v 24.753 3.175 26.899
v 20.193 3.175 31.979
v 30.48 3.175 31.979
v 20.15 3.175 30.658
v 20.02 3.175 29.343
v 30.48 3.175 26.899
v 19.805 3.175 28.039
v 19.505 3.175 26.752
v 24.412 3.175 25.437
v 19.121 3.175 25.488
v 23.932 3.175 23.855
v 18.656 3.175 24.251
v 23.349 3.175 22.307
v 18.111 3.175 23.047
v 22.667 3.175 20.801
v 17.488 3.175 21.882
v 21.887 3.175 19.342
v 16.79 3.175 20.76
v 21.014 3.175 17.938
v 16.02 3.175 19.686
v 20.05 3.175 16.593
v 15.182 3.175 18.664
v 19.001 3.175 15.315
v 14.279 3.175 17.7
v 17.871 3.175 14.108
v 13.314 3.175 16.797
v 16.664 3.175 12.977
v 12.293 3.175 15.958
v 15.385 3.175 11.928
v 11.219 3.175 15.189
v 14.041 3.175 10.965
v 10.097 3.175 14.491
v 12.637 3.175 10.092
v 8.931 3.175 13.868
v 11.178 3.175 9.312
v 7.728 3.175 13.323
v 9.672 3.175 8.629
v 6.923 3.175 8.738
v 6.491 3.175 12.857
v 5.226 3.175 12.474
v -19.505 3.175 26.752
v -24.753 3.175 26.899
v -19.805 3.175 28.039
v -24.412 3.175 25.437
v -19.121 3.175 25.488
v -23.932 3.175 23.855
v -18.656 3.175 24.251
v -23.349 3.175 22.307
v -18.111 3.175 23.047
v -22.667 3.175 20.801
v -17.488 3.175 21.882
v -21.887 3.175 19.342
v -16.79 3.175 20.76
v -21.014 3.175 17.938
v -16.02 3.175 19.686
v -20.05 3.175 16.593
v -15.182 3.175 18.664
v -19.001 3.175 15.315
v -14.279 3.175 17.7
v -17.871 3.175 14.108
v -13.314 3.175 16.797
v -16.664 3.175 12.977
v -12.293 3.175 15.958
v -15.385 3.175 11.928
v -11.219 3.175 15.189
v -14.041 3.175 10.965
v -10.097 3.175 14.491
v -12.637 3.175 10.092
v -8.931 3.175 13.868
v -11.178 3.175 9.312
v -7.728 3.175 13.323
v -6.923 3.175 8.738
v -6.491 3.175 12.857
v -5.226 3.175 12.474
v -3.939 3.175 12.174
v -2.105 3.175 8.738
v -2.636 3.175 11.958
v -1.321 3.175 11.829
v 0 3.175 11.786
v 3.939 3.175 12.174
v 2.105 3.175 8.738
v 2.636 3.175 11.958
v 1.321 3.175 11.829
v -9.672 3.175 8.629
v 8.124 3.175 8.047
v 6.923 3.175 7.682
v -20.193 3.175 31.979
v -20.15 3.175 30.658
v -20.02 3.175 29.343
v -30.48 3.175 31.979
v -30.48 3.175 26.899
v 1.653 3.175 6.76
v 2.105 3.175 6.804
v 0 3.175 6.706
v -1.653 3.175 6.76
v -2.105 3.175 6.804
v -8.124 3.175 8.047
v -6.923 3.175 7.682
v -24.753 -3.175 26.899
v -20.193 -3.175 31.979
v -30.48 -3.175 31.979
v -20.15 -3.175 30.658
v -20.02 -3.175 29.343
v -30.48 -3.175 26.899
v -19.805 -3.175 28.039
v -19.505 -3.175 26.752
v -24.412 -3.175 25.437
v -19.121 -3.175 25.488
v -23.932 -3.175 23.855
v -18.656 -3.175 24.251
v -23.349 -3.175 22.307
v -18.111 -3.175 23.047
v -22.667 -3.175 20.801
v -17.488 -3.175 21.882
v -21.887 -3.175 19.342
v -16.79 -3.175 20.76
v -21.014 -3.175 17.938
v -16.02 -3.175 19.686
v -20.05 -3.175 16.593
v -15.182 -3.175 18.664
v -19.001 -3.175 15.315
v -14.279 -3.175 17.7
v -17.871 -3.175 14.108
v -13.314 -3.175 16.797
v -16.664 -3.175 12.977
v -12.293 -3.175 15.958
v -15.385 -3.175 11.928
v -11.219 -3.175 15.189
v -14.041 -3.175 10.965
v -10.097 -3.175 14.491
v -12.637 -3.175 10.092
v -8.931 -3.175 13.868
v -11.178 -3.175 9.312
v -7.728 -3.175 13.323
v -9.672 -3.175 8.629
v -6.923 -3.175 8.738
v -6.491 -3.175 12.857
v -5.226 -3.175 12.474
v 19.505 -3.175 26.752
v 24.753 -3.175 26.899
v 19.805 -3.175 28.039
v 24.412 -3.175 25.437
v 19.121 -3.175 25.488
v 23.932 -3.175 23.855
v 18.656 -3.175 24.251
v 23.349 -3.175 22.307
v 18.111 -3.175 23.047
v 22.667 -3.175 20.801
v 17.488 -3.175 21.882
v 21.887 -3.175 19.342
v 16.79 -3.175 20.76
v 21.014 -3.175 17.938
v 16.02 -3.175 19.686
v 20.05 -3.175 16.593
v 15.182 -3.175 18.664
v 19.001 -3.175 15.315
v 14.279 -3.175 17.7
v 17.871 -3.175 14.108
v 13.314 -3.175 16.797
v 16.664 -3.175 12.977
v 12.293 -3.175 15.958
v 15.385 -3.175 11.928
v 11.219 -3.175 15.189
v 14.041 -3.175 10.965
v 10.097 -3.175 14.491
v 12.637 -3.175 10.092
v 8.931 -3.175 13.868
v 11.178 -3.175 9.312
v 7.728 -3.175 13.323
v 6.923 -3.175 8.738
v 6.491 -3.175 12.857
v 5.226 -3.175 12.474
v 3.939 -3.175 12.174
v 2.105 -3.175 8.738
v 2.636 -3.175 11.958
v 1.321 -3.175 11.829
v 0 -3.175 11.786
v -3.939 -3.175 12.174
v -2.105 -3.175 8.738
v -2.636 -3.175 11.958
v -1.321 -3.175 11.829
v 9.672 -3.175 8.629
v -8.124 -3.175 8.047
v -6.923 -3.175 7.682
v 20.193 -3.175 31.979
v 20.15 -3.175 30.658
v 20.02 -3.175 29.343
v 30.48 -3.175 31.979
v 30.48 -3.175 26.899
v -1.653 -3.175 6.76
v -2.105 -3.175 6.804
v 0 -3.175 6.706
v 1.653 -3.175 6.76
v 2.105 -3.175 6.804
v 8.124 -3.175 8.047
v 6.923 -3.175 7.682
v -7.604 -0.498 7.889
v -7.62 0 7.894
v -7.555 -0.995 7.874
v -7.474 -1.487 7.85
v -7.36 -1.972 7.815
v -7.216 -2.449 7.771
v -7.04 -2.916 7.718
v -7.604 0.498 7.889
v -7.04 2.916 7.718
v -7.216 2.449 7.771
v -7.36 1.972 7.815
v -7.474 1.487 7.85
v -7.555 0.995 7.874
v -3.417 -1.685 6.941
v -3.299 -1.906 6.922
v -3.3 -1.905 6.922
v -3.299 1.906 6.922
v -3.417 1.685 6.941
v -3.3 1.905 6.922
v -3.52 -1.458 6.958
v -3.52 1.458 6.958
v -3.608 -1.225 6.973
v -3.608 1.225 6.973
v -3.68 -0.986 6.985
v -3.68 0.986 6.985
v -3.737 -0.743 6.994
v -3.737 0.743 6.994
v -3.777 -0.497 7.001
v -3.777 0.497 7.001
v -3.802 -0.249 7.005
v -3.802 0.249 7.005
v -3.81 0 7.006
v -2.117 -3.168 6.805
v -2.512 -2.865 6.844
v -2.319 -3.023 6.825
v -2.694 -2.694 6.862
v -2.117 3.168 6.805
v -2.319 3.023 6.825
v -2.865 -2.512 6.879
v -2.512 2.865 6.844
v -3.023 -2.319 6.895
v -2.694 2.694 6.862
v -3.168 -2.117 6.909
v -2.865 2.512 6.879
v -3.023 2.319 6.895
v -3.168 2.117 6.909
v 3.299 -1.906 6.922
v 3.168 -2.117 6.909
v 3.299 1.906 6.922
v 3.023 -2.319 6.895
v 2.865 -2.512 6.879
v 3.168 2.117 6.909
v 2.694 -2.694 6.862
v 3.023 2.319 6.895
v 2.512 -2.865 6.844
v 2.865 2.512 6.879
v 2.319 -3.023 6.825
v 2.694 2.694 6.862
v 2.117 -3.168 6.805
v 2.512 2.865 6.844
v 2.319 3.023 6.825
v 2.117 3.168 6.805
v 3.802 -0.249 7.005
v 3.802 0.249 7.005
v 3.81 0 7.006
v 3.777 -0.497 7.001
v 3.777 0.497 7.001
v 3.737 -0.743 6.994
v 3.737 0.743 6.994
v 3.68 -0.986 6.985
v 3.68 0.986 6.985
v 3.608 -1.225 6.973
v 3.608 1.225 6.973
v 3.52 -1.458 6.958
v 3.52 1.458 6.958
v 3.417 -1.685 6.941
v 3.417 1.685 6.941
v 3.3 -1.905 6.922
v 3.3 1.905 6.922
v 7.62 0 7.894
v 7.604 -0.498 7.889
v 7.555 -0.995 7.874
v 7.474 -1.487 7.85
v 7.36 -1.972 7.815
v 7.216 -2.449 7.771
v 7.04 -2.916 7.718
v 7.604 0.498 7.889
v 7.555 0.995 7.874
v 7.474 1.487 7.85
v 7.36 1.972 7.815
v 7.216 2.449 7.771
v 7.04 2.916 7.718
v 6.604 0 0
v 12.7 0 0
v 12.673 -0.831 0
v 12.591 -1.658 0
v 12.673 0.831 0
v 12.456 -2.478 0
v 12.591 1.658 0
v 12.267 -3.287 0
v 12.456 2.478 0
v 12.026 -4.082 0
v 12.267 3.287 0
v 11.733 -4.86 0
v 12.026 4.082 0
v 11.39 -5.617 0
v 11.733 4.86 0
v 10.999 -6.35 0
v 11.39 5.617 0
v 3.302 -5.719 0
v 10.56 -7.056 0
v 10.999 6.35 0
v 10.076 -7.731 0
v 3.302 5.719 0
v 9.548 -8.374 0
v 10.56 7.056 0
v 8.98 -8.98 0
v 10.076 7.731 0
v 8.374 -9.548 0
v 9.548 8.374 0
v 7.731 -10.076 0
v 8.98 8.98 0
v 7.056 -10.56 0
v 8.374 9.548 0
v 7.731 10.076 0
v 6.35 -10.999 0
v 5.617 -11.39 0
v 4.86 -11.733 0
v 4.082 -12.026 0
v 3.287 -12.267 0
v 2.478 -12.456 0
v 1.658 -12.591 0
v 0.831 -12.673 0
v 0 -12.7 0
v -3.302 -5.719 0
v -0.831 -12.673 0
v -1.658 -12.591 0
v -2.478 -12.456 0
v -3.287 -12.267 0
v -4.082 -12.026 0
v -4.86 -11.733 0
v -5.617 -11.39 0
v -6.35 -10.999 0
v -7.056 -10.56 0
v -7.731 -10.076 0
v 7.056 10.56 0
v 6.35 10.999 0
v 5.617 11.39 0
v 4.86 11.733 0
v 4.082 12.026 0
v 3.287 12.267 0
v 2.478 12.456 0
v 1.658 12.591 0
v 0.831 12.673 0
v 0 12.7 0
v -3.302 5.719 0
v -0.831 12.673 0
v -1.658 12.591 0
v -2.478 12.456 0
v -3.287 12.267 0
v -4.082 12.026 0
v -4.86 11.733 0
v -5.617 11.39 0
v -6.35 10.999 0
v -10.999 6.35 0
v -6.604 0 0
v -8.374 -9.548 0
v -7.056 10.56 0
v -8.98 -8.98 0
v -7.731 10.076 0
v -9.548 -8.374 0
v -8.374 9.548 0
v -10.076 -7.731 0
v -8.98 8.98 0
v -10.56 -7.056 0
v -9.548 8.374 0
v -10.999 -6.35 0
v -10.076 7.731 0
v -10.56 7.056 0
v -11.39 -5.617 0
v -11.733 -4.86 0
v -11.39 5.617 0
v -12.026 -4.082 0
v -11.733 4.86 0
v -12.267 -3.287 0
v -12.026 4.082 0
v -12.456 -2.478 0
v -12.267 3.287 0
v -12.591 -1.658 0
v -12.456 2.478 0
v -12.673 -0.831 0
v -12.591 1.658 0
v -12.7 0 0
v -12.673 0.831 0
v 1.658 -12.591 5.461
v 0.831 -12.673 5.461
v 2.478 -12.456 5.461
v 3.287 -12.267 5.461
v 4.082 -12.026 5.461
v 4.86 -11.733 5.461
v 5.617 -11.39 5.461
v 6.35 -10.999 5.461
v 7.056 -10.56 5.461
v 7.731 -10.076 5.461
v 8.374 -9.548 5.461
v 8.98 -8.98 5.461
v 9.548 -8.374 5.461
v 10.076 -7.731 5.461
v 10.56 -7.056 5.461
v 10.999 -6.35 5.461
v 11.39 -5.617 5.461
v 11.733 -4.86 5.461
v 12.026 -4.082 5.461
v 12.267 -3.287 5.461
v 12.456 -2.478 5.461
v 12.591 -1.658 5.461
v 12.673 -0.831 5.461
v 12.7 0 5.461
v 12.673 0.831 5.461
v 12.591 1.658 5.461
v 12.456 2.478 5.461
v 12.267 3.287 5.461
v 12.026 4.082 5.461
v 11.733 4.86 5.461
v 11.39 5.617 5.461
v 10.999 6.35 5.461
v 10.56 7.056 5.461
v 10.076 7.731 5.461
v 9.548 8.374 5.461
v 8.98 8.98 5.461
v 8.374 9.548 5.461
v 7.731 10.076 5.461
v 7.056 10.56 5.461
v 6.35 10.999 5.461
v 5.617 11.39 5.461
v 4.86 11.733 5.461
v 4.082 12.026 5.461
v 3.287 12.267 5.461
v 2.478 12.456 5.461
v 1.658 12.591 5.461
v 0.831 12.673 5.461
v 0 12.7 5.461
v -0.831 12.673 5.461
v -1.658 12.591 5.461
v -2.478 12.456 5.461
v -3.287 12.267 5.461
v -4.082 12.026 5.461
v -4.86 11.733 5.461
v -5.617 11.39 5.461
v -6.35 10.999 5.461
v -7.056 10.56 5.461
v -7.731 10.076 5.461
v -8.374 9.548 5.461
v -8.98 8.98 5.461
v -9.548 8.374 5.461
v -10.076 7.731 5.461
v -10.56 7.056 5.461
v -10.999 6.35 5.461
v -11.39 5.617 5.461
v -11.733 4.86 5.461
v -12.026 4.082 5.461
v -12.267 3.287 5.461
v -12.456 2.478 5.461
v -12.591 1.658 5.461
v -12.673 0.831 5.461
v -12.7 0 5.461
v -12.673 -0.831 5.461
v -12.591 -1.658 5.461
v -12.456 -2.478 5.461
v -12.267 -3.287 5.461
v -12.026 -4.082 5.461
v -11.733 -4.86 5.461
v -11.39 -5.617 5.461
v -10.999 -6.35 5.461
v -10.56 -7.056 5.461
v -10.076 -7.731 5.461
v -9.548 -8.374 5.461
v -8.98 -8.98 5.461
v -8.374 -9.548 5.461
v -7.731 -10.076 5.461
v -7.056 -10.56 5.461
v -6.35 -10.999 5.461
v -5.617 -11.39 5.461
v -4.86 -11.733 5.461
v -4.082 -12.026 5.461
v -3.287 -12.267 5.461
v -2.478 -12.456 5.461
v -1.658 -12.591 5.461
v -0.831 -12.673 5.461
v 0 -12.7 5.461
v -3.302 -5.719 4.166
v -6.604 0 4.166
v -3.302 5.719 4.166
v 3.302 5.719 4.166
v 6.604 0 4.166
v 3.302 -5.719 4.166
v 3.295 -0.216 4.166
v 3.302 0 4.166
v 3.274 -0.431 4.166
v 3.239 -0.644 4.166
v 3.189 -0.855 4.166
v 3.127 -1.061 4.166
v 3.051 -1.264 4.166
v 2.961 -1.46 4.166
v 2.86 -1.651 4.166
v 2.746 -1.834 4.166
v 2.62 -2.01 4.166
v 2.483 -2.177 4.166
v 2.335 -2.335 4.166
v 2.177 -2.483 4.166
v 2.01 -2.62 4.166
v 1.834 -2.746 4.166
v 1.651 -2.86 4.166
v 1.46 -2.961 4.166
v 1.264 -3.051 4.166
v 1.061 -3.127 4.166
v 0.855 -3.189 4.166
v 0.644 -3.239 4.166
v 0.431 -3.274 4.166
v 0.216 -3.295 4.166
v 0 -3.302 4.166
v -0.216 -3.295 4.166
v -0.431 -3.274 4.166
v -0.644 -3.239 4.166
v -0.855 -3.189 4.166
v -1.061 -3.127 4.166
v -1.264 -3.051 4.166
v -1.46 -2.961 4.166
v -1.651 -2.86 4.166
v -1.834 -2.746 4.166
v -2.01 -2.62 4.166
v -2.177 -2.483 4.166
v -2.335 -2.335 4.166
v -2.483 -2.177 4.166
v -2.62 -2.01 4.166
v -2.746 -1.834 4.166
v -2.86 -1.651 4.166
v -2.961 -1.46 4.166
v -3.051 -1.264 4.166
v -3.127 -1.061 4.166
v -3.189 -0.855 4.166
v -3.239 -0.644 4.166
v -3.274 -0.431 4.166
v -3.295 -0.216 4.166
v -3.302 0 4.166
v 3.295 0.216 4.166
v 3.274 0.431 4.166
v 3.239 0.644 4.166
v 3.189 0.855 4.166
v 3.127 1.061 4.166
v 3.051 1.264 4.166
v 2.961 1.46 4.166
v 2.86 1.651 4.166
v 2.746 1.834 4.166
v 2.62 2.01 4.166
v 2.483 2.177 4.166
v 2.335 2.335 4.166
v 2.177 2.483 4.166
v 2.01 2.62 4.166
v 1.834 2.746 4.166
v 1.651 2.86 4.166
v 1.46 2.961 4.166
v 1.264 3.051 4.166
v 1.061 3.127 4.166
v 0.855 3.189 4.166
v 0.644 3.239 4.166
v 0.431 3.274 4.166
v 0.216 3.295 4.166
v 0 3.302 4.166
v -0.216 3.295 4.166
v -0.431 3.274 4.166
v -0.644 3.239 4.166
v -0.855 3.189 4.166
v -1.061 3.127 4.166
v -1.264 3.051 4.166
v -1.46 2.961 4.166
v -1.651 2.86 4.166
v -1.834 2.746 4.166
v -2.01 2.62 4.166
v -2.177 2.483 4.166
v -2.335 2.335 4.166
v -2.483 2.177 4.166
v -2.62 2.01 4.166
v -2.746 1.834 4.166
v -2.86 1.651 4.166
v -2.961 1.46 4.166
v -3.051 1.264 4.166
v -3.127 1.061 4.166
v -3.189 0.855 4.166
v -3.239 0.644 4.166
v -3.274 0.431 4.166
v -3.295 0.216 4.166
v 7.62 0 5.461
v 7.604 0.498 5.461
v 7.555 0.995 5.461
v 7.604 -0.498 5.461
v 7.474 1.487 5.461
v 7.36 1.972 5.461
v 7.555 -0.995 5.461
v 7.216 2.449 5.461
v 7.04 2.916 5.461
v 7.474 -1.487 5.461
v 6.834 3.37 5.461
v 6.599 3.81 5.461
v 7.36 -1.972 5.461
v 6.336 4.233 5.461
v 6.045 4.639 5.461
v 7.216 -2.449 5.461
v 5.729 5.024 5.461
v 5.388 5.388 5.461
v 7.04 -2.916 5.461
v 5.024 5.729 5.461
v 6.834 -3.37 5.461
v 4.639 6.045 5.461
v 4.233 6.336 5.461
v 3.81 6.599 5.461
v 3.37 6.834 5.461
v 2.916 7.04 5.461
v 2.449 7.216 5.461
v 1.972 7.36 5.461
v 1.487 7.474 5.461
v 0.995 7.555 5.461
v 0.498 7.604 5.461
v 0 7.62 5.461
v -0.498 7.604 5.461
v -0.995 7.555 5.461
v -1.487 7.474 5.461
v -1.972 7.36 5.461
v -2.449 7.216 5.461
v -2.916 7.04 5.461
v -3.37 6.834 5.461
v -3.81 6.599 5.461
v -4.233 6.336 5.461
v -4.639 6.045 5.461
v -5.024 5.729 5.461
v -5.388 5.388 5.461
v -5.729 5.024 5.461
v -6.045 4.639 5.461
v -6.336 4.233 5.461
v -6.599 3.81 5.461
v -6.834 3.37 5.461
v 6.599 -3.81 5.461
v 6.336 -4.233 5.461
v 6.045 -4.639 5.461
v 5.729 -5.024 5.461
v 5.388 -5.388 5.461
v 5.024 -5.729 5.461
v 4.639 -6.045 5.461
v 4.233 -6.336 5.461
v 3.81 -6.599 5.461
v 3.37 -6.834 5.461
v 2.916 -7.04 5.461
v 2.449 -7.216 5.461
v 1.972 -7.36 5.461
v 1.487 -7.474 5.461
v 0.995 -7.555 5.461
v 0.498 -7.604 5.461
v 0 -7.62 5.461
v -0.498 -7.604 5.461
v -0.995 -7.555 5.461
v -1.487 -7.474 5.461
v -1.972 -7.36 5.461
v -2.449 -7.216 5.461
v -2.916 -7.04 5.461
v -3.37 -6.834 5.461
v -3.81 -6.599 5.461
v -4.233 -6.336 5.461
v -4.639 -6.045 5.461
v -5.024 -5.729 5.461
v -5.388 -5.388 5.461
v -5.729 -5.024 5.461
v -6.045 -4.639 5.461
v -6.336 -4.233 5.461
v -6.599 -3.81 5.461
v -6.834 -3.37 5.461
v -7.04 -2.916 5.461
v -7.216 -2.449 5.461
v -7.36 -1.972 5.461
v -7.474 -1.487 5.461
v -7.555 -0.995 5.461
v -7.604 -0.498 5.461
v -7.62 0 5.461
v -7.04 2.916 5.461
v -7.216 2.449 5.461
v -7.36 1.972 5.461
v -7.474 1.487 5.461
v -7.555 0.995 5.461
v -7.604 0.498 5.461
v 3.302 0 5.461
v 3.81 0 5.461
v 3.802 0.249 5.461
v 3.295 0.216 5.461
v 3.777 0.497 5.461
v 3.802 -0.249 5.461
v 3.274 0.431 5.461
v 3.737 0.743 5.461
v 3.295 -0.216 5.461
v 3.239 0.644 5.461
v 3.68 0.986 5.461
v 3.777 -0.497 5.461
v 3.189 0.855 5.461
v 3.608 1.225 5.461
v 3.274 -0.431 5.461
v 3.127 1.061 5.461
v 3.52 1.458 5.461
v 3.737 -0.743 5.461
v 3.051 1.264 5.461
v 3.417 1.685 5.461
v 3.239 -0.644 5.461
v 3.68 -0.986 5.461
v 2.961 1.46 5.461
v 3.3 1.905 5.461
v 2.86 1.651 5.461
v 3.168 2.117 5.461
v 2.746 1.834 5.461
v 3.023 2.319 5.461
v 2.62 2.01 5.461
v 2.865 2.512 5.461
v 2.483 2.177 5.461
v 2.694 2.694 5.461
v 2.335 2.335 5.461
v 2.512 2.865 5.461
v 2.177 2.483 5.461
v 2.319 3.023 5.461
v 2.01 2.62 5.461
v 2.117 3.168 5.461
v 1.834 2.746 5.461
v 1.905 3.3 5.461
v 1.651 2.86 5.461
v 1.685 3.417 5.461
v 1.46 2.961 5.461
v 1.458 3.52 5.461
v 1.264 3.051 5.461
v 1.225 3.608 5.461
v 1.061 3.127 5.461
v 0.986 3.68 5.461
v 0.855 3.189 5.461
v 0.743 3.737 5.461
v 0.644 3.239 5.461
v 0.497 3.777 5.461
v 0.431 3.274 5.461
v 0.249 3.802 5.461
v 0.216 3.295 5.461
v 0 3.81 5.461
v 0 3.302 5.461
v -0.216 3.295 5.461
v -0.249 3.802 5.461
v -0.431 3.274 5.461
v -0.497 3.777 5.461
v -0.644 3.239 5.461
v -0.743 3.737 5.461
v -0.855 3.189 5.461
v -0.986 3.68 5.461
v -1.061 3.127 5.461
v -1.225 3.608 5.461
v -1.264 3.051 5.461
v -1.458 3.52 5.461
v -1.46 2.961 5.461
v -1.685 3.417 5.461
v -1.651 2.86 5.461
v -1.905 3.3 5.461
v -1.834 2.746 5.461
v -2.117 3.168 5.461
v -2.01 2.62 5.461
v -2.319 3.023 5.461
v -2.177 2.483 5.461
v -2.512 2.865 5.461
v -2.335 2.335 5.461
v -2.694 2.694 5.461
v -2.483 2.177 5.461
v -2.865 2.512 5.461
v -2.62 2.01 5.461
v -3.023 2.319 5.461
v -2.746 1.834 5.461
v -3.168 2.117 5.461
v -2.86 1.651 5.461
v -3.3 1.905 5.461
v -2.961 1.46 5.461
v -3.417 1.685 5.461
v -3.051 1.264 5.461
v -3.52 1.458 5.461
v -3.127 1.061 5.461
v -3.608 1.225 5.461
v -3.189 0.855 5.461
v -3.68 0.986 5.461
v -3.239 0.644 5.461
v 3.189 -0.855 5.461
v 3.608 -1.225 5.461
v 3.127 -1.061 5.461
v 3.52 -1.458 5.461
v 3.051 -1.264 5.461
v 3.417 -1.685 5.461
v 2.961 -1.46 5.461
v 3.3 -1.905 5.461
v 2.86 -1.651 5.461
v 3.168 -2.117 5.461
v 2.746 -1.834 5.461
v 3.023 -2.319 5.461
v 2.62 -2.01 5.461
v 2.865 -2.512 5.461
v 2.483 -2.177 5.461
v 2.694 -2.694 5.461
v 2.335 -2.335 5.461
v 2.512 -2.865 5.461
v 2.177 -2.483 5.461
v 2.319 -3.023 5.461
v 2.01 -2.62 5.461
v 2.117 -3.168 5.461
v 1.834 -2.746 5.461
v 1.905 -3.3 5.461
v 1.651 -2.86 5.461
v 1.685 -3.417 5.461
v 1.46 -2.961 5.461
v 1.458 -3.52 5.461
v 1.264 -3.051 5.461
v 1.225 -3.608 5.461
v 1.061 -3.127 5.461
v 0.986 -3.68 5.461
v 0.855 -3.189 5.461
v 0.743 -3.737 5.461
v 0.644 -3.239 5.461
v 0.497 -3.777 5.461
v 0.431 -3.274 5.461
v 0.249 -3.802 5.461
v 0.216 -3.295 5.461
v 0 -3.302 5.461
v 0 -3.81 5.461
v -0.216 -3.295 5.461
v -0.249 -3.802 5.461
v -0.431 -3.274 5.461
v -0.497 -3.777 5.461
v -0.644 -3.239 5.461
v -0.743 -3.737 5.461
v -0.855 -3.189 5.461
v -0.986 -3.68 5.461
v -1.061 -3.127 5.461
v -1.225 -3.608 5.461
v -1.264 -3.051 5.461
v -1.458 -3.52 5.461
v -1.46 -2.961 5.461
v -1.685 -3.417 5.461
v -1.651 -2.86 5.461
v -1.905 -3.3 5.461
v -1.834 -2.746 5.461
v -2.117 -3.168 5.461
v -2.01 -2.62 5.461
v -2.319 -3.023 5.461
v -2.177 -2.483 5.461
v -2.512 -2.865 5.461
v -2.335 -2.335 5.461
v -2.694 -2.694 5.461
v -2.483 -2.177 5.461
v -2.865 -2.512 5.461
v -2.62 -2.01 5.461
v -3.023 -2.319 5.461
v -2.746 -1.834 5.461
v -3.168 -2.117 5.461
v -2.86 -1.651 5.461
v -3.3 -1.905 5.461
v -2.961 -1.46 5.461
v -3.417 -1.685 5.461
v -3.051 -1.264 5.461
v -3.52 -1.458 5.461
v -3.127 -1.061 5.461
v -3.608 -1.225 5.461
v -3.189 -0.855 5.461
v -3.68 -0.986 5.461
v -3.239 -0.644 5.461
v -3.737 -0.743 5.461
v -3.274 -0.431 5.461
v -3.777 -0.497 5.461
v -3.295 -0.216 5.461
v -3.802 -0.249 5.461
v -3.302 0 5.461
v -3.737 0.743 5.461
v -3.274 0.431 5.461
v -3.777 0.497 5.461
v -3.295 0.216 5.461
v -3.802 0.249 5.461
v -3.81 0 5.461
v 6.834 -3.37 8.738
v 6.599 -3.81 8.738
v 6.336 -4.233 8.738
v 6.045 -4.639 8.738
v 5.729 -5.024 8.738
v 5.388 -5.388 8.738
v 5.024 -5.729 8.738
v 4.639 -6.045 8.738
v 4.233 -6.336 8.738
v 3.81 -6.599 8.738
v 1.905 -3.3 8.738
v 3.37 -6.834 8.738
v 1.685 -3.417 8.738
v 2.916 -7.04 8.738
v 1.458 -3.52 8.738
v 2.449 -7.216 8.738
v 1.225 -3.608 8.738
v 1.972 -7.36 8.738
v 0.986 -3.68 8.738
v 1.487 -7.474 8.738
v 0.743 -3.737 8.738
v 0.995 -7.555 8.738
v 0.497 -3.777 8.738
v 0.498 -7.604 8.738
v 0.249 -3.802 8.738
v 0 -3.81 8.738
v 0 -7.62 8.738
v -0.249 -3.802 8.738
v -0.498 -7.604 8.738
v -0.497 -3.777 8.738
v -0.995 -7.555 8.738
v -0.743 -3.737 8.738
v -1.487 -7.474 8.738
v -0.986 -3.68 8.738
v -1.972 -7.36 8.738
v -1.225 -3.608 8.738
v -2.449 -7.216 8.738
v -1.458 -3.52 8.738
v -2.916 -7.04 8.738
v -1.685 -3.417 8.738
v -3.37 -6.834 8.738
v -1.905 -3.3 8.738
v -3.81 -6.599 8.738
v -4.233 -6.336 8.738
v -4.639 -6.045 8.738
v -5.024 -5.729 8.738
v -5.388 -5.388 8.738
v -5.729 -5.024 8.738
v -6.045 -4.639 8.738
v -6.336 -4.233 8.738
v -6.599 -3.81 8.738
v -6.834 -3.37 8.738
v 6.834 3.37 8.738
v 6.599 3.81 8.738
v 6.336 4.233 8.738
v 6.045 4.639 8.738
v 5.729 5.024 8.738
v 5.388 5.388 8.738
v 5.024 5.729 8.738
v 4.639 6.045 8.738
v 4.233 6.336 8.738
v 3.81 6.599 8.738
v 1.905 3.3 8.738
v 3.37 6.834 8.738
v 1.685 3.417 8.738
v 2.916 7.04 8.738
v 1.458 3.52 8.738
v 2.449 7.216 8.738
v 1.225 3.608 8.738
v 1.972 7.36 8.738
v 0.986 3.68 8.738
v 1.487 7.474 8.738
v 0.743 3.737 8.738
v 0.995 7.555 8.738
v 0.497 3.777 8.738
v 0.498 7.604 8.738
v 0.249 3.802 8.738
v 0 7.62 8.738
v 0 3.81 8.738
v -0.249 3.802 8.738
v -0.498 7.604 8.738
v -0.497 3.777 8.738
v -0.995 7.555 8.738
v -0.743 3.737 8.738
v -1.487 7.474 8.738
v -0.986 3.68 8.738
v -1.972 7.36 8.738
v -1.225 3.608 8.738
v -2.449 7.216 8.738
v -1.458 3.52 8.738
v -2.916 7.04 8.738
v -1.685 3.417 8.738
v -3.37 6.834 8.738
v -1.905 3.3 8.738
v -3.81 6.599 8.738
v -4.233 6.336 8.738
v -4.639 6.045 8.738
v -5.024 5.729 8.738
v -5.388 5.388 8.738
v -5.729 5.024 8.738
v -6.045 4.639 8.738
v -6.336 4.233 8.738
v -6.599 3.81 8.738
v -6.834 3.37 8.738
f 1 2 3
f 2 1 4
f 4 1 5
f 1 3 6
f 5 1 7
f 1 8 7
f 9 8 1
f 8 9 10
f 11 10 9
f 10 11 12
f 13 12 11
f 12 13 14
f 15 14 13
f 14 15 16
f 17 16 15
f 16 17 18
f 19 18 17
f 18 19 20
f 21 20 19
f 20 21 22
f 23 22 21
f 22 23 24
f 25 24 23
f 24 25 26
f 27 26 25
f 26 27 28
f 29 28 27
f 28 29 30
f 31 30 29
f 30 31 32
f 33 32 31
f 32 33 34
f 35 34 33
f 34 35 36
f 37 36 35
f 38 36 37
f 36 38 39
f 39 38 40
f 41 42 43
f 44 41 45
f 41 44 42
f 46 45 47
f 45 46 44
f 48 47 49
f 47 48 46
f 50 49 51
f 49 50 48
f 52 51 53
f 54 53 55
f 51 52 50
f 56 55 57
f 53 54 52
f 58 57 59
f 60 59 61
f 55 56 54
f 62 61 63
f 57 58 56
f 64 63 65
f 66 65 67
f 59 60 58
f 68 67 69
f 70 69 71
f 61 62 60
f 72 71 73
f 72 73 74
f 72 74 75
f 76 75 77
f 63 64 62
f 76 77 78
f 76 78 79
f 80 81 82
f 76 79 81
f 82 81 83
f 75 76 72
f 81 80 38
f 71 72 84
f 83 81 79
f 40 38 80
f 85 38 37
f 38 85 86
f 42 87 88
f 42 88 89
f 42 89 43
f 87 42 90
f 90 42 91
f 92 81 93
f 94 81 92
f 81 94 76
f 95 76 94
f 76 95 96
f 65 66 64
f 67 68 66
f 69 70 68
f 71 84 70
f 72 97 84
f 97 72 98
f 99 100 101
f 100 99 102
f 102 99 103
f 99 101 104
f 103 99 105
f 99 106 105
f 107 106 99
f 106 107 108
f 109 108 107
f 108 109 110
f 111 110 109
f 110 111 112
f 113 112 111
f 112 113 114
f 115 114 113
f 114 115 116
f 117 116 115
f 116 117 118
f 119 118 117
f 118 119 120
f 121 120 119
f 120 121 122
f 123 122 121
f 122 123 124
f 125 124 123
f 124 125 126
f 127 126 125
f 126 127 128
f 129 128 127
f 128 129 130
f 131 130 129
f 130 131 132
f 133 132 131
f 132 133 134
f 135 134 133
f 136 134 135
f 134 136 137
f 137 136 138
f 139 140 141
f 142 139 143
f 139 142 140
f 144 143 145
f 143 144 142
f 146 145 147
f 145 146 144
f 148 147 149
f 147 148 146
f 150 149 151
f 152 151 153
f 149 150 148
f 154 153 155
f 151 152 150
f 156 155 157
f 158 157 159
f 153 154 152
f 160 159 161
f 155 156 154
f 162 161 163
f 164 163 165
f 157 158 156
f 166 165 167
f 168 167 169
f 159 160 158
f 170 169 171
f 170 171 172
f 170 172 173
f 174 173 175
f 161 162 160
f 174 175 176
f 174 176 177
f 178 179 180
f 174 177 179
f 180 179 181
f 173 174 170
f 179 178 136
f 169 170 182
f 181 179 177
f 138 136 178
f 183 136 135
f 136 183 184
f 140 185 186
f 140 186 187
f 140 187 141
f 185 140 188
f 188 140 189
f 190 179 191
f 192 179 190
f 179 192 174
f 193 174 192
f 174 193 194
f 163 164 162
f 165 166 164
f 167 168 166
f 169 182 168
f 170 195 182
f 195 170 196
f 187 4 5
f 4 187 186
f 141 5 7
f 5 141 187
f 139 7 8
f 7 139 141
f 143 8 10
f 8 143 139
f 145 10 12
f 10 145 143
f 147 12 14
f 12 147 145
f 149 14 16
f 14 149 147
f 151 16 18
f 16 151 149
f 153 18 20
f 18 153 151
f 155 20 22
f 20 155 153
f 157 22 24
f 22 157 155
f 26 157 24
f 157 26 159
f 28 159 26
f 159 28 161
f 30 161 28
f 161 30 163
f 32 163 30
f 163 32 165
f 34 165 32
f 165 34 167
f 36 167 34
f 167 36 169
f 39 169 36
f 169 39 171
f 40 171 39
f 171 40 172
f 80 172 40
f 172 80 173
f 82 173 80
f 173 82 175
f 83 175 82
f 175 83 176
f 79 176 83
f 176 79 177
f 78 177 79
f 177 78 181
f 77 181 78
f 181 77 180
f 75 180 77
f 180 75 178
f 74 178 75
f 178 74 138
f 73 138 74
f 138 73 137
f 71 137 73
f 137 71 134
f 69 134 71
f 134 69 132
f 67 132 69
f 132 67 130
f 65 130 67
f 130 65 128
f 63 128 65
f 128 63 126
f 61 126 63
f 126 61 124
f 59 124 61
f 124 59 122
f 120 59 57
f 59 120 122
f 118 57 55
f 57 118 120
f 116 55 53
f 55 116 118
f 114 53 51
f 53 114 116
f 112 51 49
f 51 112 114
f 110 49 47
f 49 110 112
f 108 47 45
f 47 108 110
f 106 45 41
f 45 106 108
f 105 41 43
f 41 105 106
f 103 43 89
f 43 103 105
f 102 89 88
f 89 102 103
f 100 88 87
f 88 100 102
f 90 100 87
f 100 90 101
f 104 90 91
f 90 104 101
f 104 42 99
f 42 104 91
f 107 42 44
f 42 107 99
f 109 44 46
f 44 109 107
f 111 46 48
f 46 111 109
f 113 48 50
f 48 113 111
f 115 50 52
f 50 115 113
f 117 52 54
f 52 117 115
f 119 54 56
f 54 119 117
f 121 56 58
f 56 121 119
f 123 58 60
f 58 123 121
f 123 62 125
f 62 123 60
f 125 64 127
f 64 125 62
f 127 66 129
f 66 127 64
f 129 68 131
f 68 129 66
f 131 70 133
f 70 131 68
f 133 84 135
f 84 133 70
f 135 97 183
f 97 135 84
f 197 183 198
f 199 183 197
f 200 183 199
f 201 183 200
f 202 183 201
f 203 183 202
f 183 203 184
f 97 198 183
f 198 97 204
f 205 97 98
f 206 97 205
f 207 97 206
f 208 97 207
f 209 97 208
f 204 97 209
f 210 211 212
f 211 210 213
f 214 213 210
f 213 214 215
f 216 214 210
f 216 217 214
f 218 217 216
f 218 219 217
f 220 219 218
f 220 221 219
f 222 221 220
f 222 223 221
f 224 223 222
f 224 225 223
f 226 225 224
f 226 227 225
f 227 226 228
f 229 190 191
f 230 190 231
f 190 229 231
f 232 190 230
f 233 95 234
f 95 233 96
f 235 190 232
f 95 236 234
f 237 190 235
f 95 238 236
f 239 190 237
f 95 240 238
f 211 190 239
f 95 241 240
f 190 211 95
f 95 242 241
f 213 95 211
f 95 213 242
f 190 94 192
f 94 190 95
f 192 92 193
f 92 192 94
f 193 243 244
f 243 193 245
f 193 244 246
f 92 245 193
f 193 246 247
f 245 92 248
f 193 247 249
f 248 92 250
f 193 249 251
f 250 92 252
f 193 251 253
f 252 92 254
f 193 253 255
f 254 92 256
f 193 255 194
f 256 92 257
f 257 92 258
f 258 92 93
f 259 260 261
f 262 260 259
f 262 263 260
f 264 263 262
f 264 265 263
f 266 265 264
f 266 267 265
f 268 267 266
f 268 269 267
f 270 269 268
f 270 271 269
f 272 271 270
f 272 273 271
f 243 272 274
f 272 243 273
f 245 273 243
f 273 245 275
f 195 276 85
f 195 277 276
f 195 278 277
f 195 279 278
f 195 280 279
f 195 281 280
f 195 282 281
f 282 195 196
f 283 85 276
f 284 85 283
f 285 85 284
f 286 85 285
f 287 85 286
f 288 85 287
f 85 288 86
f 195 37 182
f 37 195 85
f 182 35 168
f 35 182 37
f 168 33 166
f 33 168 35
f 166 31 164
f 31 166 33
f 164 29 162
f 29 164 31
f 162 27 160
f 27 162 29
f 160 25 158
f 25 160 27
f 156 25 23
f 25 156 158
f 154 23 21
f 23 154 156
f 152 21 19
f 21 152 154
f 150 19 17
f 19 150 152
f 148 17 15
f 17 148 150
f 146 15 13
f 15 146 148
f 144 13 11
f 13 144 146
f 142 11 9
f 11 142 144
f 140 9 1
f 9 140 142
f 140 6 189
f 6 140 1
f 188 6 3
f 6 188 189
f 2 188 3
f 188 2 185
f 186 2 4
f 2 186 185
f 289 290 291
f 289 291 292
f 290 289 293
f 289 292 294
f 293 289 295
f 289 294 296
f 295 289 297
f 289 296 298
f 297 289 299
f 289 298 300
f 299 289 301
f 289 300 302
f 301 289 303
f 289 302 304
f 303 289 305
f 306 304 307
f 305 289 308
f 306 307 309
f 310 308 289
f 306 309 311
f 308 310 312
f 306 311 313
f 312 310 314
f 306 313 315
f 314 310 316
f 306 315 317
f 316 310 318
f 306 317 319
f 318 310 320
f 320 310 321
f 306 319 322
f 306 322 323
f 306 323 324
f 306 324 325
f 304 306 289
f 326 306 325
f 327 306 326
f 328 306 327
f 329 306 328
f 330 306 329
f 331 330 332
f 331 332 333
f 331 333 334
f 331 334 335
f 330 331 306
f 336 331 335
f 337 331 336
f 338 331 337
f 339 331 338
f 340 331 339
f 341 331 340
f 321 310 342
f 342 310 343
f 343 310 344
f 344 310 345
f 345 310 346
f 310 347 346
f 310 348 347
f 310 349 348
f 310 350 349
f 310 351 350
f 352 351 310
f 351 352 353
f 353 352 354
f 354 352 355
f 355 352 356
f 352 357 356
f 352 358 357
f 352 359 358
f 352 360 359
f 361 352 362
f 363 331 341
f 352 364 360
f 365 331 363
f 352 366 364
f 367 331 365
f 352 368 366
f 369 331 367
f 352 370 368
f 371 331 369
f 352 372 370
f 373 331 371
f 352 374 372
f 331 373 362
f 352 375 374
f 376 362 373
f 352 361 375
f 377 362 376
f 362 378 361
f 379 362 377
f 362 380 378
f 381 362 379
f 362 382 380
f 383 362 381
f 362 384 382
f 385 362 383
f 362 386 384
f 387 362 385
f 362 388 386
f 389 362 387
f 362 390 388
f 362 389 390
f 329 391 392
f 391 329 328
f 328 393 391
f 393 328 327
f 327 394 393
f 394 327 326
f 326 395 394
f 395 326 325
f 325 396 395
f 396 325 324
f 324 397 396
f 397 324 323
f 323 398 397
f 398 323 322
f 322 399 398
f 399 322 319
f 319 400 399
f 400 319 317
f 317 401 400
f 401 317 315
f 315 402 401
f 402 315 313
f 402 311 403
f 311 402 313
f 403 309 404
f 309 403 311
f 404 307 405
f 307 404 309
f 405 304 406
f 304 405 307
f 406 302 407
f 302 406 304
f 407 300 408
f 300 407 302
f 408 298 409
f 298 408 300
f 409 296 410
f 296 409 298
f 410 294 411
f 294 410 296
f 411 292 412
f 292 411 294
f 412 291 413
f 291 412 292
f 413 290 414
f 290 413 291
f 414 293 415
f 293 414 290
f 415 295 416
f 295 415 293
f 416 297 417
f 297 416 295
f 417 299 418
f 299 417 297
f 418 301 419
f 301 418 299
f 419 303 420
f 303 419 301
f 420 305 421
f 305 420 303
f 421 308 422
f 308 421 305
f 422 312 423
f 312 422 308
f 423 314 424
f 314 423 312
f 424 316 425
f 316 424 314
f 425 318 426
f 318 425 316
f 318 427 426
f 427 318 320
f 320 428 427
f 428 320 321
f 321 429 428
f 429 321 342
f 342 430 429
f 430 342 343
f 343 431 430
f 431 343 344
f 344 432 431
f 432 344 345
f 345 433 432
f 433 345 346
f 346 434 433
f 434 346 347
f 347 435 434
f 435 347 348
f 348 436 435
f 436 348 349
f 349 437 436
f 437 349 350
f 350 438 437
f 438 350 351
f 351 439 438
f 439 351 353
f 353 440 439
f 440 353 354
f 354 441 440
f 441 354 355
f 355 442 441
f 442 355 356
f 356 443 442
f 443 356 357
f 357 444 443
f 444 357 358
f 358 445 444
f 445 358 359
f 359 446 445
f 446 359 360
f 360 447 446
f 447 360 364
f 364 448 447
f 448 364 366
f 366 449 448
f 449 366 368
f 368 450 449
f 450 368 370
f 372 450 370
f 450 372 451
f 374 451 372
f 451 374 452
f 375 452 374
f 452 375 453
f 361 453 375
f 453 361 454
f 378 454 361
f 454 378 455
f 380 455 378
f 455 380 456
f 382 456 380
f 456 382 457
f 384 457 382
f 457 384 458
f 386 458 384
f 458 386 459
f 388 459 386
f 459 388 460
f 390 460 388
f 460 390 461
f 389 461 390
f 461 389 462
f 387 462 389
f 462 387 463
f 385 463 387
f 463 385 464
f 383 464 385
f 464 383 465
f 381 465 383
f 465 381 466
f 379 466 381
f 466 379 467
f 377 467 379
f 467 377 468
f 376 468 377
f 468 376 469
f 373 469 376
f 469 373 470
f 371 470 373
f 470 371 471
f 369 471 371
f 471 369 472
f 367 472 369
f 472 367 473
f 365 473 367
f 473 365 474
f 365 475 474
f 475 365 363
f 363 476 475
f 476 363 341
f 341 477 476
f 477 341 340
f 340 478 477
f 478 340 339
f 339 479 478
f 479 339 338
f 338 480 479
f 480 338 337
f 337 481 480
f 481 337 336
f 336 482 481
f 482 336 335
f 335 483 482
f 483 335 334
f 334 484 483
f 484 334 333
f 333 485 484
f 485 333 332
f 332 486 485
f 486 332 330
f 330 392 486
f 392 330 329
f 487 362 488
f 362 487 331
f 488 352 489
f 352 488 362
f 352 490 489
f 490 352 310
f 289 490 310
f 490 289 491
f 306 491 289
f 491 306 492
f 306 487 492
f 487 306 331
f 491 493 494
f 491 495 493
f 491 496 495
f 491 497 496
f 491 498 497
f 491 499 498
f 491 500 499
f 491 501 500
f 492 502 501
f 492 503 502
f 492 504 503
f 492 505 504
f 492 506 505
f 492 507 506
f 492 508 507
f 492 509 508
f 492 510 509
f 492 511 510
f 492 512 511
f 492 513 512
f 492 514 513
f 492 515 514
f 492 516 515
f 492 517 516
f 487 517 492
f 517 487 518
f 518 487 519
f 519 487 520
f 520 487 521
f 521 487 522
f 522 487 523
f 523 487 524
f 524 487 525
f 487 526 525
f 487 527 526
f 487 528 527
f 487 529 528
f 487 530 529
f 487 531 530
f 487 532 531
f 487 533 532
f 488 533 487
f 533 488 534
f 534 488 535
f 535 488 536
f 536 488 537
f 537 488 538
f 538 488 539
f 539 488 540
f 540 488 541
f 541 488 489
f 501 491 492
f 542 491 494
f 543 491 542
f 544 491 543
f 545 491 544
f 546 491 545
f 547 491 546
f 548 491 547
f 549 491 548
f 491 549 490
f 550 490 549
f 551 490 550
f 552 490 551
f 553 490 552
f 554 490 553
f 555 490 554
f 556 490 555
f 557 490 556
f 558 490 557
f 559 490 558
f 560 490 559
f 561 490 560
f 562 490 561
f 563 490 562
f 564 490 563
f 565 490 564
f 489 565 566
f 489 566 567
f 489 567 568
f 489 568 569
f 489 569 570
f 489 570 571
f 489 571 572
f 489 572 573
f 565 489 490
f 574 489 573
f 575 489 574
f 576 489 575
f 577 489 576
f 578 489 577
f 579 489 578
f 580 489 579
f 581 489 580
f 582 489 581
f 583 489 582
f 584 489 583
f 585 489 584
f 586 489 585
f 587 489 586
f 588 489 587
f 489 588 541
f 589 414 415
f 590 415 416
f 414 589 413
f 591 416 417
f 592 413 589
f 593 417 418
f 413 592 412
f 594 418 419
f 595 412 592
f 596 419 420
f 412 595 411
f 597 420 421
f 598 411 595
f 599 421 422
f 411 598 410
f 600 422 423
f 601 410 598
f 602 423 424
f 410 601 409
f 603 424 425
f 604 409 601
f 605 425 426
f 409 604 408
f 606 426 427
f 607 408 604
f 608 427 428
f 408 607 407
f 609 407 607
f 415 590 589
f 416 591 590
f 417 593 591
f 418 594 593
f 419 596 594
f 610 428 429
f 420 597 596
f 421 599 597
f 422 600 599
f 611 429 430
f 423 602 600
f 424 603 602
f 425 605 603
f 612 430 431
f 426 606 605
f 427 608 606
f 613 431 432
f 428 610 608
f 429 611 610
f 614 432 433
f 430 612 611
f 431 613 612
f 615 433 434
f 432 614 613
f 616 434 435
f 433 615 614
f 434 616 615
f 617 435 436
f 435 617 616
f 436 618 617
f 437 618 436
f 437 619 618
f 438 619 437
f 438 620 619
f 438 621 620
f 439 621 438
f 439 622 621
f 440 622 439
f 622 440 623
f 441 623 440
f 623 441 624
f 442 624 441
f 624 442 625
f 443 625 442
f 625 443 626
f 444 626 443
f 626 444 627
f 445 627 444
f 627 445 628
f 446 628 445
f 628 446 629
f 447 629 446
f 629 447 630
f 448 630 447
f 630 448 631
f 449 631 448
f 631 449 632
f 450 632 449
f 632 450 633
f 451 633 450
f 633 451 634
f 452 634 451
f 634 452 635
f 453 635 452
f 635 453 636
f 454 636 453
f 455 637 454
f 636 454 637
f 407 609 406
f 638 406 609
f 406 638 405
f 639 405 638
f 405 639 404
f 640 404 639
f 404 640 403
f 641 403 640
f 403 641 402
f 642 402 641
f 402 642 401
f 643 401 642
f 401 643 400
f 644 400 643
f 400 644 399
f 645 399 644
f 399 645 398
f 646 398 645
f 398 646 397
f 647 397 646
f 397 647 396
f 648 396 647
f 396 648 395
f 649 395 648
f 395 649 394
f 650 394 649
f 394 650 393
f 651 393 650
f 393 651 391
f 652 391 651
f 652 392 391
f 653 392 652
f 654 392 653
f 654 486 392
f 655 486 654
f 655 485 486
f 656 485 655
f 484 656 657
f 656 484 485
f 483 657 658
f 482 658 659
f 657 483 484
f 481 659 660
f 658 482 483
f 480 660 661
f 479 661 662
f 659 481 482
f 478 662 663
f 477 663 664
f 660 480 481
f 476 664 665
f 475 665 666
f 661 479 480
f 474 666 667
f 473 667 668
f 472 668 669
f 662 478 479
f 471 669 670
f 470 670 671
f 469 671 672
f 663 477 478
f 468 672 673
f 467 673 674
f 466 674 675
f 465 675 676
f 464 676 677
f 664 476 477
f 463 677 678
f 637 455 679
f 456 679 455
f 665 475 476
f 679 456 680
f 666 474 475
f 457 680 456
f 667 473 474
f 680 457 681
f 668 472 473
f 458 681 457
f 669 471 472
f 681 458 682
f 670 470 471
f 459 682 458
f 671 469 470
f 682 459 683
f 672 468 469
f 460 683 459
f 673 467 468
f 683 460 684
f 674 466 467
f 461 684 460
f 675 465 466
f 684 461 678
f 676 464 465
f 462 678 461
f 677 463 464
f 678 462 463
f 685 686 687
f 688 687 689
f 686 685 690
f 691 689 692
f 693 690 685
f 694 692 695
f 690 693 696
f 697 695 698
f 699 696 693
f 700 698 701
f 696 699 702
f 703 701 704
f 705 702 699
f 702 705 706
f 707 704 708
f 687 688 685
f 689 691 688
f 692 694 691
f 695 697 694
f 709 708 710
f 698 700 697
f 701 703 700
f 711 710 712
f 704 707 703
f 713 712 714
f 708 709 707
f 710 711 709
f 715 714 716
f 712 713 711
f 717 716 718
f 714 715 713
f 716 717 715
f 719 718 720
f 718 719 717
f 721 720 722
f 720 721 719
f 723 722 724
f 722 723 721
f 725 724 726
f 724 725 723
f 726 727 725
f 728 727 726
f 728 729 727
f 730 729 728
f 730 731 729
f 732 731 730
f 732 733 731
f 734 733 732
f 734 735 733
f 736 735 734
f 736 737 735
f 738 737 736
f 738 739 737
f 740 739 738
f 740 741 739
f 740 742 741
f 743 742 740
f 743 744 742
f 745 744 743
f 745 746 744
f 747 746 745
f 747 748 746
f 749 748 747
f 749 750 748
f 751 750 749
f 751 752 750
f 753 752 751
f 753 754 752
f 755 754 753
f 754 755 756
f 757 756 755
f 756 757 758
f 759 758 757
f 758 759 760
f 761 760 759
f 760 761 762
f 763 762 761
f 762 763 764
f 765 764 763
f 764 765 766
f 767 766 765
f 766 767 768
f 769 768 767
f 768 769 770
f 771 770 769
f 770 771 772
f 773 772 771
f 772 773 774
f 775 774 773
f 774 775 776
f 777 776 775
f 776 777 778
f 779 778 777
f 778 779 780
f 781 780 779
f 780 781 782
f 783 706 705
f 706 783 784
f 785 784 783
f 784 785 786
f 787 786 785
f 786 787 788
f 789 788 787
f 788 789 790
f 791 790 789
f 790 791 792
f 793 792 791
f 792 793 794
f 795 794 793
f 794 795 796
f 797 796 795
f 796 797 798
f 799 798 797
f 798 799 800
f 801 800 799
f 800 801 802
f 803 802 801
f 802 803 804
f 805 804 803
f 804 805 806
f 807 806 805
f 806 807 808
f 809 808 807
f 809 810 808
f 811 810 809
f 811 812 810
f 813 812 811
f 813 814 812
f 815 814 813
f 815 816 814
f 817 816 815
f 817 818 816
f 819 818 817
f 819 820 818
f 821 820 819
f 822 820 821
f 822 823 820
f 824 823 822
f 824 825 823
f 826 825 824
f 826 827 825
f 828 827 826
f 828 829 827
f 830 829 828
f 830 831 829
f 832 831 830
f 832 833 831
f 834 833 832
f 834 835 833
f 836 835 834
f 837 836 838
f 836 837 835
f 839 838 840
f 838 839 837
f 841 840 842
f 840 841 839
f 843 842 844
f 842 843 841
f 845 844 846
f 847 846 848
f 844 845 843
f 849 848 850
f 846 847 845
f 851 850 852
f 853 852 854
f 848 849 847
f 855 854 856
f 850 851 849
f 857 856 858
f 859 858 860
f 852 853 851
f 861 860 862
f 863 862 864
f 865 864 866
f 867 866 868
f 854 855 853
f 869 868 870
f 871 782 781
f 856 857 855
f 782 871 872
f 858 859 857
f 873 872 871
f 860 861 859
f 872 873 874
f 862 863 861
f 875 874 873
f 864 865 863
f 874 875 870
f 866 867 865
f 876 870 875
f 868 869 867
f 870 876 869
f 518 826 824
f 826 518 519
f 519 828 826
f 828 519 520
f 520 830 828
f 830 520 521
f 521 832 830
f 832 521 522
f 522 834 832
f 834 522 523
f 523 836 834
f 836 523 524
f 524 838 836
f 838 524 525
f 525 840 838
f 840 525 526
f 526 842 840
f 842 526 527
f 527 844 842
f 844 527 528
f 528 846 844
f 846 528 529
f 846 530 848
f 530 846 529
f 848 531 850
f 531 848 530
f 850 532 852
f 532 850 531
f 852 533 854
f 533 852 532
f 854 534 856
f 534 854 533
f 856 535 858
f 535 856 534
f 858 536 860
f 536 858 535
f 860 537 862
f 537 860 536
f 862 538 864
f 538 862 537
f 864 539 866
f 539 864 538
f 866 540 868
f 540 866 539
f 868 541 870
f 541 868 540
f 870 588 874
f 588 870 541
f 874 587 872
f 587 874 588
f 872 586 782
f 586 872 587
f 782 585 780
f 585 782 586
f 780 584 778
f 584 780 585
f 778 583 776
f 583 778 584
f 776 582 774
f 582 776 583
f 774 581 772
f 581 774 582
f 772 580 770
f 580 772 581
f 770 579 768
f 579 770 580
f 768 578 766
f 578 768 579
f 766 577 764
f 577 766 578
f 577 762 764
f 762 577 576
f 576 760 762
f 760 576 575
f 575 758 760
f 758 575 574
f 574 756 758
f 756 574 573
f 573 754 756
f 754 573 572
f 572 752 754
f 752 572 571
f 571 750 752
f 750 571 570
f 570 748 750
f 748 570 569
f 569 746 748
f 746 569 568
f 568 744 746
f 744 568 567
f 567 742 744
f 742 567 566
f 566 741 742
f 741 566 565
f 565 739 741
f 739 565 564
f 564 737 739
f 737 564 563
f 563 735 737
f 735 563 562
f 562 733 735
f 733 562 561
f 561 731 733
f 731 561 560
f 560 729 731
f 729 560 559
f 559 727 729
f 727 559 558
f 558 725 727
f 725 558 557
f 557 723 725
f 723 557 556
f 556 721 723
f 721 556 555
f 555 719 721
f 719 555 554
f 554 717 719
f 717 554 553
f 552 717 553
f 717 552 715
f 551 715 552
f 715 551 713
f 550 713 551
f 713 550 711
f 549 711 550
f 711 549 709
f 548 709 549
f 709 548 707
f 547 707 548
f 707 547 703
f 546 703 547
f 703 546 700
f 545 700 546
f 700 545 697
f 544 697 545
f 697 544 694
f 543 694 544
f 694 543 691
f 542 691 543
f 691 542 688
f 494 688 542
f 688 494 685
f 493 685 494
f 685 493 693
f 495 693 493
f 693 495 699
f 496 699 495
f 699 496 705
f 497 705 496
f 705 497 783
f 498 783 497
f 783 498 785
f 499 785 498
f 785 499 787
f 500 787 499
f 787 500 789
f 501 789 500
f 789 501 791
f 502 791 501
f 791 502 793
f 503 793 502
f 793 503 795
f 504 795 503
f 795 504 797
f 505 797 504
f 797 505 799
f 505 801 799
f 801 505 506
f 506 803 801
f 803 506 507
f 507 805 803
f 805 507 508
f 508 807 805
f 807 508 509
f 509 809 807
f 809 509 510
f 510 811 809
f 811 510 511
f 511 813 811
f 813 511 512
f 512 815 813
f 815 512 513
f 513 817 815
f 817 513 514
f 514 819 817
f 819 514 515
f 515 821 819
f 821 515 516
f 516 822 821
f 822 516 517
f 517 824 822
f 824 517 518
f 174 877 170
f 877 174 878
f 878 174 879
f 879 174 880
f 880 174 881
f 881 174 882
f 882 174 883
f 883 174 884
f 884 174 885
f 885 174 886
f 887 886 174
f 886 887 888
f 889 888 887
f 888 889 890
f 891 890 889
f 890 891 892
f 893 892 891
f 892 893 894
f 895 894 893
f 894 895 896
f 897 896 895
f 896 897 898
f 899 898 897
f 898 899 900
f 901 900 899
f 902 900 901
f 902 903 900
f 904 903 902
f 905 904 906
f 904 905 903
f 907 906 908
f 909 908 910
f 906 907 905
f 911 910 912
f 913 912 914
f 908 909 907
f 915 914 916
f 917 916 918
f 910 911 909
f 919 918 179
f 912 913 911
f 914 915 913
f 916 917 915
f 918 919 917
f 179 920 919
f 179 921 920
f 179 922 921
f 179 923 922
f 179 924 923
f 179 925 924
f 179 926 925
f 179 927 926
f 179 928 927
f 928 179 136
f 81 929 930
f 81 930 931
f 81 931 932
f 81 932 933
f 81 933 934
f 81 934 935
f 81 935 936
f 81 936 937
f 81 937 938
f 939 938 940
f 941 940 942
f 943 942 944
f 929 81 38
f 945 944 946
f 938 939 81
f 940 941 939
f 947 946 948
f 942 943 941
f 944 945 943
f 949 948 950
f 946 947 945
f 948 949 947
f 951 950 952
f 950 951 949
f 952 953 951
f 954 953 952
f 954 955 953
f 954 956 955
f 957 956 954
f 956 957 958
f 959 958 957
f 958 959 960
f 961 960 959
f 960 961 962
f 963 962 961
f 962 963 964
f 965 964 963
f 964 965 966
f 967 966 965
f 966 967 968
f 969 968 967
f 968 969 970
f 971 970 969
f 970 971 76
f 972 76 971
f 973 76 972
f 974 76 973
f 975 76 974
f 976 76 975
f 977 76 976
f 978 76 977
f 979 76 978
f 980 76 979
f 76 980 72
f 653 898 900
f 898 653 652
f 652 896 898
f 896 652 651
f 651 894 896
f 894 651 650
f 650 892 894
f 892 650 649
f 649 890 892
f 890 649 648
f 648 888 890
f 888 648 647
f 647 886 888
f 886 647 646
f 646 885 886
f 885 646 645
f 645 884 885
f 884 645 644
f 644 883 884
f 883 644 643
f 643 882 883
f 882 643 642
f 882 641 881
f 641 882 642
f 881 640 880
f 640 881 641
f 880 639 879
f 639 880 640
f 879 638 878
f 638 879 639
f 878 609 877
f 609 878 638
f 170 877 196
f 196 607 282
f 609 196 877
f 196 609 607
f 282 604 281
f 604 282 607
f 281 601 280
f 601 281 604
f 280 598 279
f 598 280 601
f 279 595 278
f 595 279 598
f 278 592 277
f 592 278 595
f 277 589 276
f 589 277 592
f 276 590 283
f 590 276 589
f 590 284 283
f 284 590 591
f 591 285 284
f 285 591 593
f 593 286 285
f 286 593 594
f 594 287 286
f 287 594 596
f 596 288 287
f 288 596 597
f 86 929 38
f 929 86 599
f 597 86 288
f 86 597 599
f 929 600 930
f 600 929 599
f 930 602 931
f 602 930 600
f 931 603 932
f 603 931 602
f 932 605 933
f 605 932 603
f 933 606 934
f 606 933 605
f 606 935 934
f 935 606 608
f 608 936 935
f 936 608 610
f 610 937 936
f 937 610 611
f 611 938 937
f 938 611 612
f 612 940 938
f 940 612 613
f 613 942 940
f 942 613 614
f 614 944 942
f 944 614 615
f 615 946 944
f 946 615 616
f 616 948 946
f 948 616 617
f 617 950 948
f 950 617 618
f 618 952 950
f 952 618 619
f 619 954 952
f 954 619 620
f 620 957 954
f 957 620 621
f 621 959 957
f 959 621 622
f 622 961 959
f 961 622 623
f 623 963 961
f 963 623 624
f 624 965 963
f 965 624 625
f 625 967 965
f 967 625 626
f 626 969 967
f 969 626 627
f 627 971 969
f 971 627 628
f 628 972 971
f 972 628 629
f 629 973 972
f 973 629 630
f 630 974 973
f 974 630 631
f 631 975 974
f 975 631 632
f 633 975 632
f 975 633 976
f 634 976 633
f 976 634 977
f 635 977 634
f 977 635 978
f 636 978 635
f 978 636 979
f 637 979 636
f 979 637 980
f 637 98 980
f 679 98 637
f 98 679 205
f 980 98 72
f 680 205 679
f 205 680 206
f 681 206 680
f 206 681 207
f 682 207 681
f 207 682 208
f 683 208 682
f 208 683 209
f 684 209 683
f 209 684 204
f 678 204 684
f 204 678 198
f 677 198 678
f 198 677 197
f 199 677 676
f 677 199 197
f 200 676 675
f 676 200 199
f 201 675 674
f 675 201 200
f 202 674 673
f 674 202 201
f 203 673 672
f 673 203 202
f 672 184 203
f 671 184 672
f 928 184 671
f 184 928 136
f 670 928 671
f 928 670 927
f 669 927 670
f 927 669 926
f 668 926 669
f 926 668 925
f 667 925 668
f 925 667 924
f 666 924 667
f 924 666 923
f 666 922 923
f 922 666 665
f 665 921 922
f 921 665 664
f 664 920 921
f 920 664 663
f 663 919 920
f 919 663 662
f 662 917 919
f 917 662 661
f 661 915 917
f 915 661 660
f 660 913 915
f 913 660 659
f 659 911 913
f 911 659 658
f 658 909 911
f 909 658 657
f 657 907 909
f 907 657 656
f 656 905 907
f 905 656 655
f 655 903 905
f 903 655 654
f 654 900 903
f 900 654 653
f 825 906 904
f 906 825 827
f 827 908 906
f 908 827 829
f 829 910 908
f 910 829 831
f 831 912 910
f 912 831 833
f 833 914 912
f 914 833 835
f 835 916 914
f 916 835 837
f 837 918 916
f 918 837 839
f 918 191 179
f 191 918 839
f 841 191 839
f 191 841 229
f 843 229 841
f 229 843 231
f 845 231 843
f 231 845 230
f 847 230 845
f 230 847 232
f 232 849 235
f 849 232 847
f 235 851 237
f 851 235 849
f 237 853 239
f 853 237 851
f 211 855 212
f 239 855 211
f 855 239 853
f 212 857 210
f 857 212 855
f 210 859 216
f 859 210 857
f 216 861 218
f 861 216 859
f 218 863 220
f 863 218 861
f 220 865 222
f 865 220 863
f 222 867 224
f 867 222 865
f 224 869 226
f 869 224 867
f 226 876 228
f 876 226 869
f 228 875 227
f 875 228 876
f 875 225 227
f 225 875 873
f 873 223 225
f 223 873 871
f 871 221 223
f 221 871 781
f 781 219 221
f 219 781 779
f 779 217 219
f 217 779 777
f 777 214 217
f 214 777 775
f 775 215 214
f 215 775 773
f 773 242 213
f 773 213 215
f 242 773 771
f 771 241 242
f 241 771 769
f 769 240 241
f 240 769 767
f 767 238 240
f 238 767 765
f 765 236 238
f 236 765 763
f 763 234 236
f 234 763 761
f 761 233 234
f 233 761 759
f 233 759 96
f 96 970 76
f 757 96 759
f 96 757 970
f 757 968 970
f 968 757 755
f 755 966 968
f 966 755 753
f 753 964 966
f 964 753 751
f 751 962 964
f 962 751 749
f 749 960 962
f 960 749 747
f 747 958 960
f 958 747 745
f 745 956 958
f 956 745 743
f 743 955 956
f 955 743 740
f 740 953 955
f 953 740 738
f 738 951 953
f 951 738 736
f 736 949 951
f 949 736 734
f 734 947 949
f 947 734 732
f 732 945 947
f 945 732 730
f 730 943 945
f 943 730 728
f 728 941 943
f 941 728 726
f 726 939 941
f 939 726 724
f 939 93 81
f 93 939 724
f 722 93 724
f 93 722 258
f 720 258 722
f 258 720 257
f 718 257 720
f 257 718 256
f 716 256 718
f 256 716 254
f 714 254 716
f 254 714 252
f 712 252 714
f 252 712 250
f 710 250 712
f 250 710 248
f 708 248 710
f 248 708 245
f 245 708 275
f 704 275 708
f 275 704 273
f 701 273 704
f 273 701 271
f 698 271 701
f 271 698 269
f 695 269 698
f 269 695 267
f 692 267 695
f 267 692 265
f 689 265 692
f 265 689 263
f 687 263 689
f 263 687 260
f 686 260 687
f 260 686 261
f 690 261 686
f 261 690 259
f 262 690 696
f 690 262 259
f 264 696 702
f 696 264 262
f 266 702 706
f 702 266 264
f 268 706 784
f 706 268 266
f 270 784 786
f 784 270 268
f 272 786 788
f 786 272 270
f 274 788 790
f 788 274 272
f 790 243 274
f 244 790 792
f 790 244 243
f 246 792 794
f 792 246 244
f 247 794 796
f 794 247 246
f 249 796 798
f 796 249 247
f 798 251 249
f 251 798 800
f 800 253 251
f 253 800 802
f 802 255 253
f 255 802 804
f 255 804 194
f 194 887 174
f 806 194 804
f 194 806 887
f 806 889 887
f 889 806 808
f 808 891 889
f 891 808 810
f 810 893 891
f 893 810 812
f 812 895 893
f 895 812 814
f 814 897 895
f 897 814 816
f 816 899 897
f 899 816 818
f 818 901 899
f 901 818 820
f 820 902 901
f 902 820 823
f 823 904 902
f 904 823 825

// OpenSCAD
ViewScale = [0.0254, 0.0254, 0.0254];

module aspheric_mount()
{
    translate([0, 125, 995+264])
    rotate([90, 0, 0])
    linear_extrude(250) {
        difference() {
            circle(995, $fn=96);
            circle(795, $fn=96);
            translate([-1000, 0, 0])
            square([2000, 1100]);
        }
        translate([-1050, -100, 0])
        square([300, 200], center=true);

        translate([1050, -100, 0])
        square([300, 200], center=true);
    }

    linear_extrude(165)
    difference() {
        circle(500, $fn=96);
        circle(260, $fn=6);
    }
    translate([0, 0, 164])
    linear_extrude(51)
    difference() {
        circle(500, $fn=96);
        circle(130, $fn=96);
    }

    translate([0, 0, 214])
    linear_extrude(130)
    difference() {
        circle(300, $fn=96);
        circle(150, $fn=96);
    }
}

scale(ViewScale)
{
    aspheric_mount();
}
